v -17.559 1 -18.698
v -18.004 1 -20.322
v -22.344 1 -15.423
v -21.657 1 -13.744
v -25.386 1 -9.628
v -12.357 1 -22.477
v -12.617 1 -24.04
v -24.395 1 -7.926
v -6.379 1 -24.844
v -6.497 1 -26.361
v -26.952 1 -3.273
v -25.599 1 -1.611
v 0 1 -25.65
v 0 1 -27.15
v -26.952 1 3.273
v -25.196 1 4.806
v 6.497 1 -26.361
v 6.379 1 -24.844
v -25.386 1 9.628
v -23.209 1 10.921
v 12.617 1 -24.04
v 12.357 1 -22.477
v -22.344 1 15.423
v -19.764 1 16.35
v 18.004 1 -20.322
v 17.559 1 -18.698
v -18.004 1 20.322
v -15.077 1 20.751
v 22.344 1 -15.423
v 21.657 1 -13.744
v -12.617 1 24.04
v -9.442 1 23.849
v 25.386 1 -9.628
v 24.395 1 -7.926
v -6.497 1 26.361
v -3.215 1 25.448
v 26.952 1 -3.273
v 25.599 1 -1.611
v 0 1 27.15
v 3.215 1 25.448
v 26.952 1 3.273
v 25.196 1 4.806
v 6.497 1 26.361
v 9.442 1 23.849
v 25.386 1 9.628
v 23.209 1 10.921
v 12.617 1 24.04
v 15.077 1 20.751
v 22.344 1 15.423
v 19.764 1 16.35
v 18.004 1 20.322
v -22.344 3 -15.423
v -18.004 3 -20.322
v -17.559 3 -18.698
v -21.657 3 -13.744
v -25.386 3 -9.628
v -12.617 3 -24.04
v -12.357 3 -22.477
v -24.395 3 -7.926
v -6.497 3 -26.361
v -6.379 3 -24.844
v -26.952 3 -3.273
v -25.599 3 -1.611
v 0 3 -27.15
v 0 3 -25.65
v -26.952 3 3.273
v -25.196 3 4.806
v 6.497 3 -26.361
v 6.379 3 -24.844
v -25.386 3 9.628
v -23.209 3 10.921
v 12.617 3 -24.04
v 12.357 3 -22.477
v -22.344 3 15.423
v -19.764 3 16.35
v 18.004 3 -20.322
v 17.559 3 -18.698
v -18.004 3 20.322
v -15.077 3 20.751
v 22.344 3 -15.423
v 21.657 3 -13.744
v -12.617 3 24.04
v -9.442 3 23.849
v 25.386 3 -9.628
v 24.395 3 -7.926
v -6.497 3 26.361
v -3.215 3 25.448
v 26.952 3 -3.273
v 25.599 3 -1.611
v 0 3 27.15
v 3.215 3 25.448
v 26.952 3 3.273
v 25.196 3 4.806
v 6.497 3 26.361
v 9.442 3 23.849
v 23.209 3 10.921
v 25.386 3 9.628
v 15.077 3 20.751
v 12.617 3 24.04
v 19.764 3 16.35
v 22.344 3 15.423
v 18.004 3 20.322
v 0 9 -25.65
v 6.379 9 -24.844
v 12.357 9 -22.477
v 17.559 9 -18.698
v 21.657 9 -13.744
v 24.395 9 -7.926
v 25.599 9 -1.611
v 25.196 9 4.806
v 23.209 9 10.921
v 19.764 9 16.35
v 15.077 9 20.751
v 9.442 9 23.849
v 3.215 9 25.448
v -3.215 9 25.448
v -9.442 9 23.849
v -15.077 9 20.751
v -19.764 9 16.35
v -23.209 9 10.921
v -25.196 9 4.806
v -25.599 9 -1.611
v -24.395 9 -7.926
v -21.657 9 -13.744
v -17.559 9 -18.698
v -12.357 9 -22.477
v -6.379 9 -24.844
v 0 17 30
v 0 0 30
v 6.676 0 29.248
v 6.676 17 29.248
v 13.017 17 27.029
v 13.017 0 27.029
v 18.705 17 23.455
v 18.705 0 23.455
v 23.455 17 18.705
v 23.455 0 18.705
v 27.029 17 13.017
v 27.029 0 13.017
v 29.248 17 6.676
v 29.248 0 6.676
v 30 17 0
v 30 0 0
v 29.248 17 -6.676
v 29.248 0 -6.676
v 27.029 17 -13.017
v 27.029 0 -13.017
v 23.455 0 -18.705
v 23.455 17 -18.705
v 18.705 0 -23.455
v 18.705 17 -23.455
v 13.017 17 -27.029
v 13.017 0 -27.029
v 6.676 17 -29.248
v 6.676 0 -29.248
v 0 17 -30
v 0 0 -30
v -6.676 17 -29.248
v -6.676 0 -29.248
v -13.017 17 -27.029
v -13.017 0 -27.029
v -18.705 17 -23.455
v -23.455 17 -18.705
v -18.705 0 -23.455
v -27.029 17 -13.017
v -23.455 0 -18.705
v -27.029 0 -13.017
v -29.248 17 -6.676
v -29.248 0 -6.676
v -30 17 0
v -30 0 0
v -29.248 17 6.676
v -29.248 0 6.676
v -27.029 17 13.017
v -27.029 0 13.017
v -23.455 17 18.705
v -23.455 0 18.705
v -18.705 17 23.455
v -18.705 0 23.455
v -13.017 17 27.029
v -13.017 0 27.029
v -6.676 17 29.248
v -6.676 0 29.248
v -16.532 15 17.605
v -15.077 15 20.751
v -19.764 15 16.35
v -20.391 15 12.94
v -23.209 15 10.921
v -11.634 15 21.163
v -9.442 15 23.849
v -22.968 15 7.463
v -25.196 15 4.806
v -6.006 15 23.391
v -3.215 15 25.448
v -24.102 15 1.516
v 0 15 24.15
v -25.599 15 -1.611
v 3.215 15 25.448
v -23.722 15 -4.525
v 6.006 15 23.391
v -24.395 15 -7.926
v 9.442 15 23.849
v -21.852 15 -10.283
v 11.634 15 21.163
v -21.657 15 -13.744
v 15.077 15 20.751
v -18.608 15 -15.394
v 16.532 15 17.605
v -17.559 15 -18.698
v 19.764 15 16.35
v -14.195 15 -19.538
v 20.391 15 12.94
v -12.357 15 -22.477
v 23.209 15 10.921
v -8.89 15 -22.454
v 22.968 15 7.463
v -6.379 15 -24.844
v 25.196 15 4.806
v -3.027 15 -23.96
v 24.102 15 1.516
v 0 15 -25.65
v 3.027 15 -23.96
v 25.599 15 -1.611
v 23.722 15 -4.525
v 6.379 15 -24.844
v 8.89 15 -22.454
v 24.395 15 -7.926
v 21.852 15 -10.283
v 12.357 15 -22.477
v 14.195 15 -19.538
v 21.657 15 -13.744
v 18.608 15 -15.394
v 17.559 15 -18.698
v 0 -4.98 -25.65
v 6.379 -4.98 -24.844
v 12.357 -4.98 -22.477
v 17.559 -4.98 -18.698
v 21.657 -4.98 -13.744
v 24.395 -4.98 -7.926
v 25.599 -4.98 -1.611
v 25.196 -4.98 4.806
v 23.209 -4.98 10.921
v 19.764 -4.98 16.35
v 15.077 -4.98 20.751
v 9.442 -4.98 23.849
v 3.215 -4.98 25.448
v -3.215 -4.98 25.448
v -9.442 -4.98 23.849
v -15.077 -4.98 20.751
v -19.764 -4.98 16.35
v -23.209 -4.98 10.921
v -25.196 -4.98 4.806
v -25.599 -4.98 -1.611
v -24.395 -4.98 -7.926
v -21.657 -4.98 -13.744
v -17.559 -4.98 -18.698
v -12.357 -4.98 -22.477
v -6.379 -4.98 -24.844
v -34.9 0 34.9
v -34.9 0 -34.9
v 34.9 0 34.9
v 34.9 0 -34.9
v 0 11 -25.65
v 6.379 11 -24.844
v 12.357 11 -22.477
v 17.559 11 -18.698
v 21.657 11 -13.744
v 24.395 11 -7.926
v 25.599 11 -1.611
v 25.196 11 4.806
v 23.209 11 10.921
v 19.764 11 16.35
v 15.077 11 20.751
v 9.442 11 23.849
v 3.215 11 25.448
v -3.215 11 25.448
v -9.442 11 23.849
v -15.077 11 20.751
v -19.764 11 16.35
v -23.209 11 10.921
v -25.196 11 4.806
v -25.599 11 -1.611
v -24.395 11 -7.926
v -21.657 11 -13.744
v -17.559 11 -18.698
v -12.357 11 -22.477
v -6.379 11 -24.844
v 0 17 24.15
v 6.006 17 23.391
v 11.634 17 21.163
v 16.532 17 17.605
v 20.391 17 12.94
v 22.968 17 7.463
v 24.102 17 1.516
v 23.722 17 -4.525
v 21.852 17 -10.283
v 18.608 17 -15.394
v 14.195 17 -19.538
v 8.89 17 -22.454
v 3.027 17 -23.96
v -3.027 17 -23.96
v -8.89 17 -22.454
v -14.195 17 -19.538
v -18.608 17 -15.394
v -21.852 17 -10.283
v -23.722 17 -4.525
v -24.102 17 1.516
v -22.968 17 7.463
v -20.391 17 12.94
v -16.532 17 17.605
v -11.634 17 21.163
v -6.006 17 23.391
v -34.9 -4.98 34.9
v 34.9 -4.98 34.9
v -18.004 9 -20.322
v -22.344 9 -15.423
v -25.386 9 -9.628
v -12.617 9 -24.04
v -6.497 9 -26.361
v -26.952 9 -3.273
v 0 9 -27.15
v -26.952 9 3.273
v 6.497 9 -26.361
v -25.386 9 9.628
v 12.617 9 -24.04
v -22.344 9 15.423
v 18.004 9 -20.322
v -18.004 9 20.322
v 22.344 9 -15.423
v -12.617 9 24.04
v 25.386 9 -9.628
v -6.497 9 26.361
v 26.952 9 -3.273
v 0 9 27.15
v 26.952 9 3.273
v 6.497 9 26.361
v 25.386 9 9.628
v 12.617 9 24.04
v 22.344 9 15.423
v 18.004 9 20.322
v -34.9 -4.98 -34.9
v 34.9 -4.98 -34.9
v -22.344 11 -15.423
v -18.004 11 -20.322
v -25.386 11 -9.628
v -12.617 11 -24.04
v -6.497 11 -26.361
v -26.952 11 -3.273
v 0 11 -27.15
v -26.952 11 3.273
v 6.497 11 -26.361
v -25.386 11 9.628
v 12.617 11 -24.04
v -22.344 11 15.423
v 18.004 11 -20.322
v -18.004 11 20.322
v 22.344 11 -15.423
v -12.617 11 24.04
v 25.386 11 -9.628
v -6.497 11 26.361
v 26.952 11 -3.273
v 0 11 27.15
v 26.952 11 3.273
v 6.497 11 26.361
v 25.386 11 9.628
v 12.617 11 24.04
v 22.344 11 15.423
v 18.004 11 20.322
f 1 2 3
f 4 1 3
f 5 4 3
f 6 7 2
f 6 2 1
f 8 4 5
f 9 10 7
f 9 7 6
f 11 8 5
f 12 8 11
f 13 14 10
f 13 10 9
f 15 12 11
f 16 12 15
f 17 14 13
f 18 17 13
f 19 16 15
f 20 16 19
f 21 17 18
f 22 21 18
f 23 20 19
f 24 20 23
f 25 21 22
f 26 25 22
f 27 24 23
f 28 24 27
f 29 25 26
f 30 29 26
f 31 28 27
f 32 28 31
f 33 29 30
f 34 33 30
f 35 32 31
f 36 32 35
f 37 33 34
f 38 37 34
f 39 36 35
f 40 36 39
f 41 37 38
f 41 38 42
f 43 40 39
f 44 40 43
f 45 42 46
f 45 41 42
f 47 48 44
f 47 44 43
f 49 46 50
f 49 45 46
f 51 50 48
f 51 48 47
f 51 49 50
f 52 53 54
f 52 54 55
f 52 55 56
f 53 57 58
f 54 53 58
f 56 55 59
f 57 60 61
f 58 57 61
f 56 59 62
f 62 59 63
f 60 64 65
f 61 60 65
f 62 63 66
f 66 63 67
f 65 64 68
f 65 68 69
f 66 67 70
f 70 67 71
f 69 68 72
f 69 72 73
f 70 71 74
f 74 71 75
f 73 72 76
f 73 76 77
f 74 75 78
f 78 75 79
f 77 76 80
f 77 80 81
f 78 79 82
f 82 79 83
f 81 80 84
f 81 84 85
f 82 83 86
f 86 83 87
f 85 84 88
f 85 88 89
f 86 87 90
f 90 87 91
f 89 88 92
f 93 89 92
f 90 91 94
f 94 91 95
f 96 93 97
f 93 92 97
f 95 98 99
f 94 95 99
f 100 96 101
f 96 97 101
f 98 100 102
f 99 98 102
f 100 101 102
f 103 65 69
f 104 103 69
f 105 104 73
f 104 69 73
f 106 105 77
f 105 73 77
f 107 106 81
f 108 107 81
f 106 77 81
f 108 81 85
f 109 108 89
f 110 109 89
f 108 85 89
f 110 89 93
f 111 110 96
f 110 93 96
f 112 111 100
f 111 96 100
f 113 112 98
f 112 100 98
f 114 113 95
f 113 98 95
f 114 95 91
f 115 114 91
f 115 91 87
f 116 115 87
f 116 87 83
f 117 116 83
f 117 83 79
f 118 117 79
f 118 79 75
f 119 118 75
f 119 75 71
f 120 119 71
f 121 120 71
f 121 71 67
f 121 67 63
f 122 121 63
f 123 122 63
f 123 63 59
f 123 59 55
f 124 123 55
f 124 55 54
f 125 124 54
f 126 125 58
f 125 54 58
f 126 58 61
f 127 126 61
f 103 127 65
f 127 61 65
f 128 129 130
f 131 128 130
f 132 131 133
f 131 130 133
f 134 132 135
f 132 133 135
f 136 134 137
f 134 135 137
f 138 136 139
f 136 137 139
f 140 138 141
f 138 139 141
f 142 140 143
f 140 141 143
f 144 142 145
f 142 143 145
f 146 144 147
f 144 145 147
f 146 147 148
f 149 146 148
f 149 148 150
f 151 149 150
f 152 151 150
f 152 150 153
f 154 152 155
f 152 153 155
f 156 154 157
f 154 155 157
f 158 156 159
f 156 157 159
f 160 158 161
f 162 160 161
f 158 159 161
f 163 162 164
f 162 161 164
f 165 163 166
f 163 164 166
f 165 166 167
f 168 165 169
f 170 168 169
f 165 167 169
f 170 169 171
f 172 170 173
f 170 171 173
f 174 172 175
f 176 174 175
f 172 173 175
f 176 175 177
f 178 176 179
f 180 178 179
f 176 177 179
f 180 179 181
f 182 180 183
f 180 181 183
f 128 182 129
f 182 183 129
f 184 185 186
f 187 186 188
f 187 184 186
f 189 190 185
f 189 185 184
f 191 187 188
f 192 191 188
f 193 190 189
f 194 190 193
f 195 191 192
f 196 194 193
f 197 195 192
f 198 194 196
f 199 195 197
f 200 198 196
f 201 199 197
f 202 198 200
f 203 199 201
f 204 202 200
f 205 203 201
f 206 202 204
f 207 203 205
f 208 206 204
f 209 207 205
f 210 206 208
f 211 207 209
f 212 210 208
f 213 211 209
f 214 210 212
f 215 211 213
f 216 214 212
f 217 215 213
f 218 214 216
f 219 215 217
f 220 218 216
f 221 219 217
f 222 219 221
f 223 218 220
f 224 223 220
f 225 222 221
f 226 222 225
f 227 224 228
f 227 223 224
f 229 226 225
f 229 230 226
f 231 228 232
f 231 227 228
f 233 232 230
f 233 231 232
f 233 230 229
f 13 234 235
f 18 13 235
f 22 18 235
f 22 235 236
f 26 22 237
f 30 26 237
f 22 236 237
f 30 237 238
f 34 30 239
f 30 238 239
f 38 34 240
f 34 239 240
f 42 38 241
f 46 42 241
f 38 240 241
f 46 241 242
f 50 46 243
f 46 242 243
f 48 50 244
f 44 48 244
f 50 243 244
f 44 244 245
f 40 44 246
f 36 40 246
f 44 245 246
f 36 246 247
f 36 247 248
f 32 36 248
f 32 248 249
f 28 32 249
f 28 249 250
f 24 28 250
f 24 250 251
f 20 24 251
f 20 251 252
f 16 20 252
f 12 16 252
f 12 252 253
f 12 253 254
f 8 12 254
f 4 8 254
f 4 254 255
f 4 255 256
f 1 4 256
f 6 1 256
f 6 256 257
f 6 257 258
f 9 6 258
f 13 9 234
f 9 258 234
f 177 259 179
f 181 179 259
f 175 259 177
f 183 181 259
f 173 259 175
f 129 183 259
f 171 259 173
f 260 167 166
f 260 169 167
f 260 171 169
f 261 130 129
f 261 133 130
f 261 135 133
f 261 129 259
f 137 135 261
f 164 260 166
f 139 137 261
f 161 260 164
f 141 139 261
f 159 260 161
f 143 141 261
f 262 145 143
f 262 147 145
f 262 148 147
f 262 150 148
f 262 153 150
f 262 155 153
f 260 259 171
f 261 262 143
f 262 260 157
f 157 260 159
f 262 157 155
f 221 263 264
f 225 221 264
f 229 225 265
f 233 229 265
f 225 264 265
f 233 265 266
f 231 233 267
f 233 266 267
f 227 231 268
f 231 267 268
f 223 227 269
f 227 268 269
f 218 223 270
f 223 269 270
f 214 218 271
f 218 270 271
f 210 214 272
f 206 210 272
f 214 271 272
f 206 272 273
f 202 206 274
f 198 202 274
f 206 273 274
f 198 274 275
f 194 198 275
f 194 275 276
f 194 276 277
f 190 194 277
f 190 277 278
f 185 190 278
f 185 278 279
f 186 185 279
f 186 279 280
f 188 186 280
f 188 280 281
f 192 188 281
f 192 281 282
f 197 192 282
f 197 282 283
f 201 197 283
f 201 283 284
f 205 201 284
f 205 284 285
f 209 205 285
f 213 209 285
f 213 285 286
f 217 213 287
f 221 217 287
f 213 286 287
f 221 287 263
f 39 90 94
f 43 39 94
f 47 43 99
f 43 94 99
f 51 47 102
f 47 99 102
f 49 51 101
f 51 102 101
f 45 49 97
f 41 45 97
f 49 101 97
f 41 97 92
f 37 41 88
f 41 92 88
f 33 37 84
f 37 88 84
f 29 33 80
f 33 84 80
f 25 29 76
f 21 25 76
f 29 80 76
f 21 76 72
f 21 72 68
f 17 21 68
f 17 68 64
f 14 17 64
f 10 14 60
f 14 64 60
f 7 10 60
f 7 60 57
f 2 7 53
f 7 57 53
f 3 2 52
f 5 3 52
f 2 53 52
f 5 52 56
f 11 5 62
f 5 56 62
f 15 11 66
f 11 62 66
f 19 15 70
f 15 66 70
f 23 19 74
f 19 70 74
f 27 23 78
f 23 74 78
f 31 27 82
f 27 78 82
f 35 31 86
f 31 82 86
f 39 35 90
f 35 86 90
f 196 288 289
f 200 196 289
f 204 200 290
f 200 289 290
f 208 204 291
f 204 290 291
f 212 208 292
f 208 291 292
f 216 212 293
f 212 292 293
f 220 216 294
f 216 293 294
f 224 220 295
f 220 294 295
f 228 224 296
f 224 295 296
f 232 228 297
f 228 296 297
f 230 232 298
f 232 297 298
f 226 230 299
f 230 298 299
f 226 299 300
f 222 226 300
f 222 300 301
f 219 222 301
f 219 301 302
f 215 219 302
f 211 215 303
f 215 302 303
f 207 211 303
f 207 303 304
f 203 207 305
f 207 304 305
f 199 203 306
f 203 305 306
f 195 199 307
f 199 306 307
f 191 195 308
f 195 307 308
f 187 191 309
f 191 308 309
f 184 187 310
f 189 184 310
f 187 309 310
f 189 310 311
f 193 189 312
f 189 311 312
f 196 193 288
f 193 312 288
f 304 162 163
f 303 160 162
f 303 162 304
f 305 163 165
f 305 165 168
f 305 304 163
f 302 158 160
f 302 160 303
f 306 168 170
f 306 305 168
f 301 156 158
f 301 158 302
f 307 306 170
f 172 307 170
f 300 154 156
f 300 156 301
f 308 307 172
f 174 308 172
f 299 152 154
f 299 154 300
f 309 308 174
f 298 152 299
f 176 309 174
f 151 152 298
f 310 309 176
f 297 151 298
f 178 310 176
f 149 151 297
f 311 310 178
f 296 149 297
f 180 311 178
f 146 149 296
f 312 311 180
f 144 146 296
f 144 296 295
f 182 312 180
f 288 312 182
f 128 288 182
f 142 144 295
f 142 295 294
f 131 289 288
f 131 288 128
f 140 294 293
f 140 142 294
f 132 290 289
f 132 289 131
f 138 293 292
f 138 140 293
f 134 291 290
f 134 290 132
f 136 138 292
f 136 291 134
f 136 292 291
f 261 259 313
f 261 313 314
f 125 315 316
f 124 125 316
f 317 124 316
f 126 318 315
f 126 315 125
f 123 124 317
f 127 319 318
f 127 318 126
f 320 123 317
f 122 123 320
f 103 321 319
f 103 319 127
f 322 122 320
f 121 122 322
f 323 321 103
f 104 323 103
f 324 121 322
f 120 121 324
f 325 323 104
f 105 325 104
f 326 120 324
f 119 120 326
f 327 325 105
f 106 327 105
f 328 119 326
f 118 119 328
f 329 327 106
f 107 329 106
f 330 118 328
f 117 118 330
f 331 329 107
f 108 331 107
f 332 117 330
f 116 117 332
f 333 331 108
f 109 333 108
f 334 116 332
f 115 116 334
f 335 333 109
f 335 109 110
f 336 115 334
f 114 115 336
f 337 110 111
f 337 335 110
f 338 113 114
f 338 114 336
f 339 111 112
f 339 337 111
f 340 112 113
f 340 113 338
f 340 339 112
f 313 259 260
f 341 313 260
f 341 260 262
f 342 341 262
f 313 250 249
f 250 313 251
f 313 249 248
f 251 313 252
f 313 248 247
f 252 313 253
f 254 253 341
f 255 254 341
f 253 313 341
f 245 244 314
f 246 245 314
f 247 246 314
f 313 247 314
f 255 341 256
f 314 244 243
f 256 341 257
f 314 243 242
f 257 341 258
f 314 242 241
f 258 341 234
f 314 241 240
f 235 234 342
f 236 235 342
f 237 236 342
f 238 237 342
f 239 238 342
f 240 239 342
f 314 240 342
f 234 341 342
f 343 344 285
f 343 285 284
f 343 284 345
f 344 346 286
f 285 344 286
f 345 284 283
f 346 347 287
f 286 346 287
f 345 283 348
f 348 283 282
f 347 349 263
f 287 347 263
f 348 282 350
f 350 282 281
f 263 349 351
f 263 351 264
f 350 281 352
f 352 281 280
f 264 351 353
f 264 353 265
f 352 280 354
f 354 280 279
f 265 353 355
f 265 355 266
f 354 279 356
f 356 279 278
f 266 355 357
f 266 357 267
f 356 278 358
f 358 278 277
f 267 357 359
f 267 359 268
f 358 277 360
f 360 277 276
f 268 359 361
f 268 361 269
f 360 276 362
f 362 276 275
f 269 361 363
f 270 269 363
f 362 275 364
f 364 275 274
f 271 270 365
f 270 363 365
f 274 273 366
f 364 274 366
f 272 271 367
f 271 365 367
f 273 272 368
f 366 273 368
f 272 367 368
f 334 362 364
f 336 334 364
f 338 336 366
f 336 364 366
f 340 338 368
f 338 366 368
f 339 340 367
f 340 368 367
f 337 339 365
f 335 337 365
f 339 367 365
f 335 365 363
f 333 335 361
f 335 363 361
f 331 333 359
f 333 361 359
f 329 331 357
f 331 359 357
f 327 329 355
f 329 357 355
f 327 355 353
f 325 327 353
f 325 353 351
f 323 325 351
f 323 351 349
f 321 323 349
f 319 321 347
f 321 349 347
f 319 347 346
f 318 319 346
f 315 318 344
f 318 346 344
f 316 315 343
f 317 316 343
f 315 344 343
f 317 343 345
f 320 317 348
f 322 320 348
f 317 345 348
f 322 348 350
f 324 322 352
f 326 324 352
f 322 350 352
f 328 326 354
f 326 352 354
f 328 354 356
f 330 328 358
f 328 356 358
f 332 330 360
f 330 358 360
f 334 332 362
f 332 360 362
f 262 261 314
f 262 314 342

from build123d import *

# Parameters (mm, degrees)
SKETCH1_W           = 69.8
SKETCH1_H           = 69.8
BOSS_EXTRUDE1_DEPTH = 4.98
SKETCH2_R           = 30
BOSS_EXTRUDE2_DEPTH = 17
SKETCH3_R           = 25.65
CUT_EXTRUDE1_DEPTH  = 19.98
SKETCH4_R           = 24.15
CUT_EXTRUDE3_DEPTH  = 2
CUT_EXTRUDE4_START  = -6
SKETCH5_R           = 27.15
CUT_EXTRUDE4_DEPTH  = 2
CUT_EXTRUDE5_START  = -14
SKETCH5_2_R         = 27.15
CUT_EXTRUDE5_DEPTH  = 2


with BuildPart() as part:
    # Sketch1 → Boss-Extrude1 (new body)
    with BuildSketch(Plane(origin=(0, 0, 0), x_dir=(1, 0, 0), z_dir=(0, 1, 0))):
        Rectangle(SKETCH1_W, SKETCH1_H)
    extrude(amount=-BOSS_EXTRUDE1_DEPTH)

    # Sketch2 → Boss-Extrude2 (add)
    with BuildSketch(Plane(origin=(0, 0, 0), x_dir=(1, 0, 0), z_dir=(0, 1, 0))):
        Circle(SKETCH2_R)
    extrude(amount=BOSS_EXTRUDE2_DEPTH)

    # Sketch3 → Cut-Extrude1 (cut)
    with BuildSketch(Plane.XZ.offset(4.98)):
        Circle(SKETCH3_R)
    extrude(amount=-CUT_EXTRUDE1_DEPTH, mode=Mode.SUBTRACT)

    # Sketch4 → Cut-Extrude3 (cut)
    with BuildSketch(Plane(origin=(0, 17, 0), x_dir=(1, 0, 0), z_dir=(0, 1, 0))):
        Circle(SKETCH4_R)
    extrude(amount=-CUT_EXTRUDE3_DEPTH, mode=Mode.SUBTRACT)

    # Sketch5 → Cut-Extrude4 (cut)
    with BuildSketch(Plane(origin=(0, 17, 0), x_dir=(1, 0, 0), z_dir=(0, 1, 0)).offset(CUT_EXTRUDE4_START)):
        Circle(SKETCH5_R)
    extrude(amount=-CUT_EXTRUDE4_DEPTH, mode=Mode.SUBTRACT)

    # Sketch5<2> → Cut-Extrude5 (cut)
    with BuildSketch(Plane(origin=(0, 17, 0), x_dir=(1, 0, 0), z_dir=(0, 1, 0)).offset(CUT_EXTRUDE5_START)):
        Circle(SKETCH5_2_R)
    extrude(amount=-CUT_EXTRUDE5_DEPTH, mode=Mode.SUBTRACT)


solid = part.part
